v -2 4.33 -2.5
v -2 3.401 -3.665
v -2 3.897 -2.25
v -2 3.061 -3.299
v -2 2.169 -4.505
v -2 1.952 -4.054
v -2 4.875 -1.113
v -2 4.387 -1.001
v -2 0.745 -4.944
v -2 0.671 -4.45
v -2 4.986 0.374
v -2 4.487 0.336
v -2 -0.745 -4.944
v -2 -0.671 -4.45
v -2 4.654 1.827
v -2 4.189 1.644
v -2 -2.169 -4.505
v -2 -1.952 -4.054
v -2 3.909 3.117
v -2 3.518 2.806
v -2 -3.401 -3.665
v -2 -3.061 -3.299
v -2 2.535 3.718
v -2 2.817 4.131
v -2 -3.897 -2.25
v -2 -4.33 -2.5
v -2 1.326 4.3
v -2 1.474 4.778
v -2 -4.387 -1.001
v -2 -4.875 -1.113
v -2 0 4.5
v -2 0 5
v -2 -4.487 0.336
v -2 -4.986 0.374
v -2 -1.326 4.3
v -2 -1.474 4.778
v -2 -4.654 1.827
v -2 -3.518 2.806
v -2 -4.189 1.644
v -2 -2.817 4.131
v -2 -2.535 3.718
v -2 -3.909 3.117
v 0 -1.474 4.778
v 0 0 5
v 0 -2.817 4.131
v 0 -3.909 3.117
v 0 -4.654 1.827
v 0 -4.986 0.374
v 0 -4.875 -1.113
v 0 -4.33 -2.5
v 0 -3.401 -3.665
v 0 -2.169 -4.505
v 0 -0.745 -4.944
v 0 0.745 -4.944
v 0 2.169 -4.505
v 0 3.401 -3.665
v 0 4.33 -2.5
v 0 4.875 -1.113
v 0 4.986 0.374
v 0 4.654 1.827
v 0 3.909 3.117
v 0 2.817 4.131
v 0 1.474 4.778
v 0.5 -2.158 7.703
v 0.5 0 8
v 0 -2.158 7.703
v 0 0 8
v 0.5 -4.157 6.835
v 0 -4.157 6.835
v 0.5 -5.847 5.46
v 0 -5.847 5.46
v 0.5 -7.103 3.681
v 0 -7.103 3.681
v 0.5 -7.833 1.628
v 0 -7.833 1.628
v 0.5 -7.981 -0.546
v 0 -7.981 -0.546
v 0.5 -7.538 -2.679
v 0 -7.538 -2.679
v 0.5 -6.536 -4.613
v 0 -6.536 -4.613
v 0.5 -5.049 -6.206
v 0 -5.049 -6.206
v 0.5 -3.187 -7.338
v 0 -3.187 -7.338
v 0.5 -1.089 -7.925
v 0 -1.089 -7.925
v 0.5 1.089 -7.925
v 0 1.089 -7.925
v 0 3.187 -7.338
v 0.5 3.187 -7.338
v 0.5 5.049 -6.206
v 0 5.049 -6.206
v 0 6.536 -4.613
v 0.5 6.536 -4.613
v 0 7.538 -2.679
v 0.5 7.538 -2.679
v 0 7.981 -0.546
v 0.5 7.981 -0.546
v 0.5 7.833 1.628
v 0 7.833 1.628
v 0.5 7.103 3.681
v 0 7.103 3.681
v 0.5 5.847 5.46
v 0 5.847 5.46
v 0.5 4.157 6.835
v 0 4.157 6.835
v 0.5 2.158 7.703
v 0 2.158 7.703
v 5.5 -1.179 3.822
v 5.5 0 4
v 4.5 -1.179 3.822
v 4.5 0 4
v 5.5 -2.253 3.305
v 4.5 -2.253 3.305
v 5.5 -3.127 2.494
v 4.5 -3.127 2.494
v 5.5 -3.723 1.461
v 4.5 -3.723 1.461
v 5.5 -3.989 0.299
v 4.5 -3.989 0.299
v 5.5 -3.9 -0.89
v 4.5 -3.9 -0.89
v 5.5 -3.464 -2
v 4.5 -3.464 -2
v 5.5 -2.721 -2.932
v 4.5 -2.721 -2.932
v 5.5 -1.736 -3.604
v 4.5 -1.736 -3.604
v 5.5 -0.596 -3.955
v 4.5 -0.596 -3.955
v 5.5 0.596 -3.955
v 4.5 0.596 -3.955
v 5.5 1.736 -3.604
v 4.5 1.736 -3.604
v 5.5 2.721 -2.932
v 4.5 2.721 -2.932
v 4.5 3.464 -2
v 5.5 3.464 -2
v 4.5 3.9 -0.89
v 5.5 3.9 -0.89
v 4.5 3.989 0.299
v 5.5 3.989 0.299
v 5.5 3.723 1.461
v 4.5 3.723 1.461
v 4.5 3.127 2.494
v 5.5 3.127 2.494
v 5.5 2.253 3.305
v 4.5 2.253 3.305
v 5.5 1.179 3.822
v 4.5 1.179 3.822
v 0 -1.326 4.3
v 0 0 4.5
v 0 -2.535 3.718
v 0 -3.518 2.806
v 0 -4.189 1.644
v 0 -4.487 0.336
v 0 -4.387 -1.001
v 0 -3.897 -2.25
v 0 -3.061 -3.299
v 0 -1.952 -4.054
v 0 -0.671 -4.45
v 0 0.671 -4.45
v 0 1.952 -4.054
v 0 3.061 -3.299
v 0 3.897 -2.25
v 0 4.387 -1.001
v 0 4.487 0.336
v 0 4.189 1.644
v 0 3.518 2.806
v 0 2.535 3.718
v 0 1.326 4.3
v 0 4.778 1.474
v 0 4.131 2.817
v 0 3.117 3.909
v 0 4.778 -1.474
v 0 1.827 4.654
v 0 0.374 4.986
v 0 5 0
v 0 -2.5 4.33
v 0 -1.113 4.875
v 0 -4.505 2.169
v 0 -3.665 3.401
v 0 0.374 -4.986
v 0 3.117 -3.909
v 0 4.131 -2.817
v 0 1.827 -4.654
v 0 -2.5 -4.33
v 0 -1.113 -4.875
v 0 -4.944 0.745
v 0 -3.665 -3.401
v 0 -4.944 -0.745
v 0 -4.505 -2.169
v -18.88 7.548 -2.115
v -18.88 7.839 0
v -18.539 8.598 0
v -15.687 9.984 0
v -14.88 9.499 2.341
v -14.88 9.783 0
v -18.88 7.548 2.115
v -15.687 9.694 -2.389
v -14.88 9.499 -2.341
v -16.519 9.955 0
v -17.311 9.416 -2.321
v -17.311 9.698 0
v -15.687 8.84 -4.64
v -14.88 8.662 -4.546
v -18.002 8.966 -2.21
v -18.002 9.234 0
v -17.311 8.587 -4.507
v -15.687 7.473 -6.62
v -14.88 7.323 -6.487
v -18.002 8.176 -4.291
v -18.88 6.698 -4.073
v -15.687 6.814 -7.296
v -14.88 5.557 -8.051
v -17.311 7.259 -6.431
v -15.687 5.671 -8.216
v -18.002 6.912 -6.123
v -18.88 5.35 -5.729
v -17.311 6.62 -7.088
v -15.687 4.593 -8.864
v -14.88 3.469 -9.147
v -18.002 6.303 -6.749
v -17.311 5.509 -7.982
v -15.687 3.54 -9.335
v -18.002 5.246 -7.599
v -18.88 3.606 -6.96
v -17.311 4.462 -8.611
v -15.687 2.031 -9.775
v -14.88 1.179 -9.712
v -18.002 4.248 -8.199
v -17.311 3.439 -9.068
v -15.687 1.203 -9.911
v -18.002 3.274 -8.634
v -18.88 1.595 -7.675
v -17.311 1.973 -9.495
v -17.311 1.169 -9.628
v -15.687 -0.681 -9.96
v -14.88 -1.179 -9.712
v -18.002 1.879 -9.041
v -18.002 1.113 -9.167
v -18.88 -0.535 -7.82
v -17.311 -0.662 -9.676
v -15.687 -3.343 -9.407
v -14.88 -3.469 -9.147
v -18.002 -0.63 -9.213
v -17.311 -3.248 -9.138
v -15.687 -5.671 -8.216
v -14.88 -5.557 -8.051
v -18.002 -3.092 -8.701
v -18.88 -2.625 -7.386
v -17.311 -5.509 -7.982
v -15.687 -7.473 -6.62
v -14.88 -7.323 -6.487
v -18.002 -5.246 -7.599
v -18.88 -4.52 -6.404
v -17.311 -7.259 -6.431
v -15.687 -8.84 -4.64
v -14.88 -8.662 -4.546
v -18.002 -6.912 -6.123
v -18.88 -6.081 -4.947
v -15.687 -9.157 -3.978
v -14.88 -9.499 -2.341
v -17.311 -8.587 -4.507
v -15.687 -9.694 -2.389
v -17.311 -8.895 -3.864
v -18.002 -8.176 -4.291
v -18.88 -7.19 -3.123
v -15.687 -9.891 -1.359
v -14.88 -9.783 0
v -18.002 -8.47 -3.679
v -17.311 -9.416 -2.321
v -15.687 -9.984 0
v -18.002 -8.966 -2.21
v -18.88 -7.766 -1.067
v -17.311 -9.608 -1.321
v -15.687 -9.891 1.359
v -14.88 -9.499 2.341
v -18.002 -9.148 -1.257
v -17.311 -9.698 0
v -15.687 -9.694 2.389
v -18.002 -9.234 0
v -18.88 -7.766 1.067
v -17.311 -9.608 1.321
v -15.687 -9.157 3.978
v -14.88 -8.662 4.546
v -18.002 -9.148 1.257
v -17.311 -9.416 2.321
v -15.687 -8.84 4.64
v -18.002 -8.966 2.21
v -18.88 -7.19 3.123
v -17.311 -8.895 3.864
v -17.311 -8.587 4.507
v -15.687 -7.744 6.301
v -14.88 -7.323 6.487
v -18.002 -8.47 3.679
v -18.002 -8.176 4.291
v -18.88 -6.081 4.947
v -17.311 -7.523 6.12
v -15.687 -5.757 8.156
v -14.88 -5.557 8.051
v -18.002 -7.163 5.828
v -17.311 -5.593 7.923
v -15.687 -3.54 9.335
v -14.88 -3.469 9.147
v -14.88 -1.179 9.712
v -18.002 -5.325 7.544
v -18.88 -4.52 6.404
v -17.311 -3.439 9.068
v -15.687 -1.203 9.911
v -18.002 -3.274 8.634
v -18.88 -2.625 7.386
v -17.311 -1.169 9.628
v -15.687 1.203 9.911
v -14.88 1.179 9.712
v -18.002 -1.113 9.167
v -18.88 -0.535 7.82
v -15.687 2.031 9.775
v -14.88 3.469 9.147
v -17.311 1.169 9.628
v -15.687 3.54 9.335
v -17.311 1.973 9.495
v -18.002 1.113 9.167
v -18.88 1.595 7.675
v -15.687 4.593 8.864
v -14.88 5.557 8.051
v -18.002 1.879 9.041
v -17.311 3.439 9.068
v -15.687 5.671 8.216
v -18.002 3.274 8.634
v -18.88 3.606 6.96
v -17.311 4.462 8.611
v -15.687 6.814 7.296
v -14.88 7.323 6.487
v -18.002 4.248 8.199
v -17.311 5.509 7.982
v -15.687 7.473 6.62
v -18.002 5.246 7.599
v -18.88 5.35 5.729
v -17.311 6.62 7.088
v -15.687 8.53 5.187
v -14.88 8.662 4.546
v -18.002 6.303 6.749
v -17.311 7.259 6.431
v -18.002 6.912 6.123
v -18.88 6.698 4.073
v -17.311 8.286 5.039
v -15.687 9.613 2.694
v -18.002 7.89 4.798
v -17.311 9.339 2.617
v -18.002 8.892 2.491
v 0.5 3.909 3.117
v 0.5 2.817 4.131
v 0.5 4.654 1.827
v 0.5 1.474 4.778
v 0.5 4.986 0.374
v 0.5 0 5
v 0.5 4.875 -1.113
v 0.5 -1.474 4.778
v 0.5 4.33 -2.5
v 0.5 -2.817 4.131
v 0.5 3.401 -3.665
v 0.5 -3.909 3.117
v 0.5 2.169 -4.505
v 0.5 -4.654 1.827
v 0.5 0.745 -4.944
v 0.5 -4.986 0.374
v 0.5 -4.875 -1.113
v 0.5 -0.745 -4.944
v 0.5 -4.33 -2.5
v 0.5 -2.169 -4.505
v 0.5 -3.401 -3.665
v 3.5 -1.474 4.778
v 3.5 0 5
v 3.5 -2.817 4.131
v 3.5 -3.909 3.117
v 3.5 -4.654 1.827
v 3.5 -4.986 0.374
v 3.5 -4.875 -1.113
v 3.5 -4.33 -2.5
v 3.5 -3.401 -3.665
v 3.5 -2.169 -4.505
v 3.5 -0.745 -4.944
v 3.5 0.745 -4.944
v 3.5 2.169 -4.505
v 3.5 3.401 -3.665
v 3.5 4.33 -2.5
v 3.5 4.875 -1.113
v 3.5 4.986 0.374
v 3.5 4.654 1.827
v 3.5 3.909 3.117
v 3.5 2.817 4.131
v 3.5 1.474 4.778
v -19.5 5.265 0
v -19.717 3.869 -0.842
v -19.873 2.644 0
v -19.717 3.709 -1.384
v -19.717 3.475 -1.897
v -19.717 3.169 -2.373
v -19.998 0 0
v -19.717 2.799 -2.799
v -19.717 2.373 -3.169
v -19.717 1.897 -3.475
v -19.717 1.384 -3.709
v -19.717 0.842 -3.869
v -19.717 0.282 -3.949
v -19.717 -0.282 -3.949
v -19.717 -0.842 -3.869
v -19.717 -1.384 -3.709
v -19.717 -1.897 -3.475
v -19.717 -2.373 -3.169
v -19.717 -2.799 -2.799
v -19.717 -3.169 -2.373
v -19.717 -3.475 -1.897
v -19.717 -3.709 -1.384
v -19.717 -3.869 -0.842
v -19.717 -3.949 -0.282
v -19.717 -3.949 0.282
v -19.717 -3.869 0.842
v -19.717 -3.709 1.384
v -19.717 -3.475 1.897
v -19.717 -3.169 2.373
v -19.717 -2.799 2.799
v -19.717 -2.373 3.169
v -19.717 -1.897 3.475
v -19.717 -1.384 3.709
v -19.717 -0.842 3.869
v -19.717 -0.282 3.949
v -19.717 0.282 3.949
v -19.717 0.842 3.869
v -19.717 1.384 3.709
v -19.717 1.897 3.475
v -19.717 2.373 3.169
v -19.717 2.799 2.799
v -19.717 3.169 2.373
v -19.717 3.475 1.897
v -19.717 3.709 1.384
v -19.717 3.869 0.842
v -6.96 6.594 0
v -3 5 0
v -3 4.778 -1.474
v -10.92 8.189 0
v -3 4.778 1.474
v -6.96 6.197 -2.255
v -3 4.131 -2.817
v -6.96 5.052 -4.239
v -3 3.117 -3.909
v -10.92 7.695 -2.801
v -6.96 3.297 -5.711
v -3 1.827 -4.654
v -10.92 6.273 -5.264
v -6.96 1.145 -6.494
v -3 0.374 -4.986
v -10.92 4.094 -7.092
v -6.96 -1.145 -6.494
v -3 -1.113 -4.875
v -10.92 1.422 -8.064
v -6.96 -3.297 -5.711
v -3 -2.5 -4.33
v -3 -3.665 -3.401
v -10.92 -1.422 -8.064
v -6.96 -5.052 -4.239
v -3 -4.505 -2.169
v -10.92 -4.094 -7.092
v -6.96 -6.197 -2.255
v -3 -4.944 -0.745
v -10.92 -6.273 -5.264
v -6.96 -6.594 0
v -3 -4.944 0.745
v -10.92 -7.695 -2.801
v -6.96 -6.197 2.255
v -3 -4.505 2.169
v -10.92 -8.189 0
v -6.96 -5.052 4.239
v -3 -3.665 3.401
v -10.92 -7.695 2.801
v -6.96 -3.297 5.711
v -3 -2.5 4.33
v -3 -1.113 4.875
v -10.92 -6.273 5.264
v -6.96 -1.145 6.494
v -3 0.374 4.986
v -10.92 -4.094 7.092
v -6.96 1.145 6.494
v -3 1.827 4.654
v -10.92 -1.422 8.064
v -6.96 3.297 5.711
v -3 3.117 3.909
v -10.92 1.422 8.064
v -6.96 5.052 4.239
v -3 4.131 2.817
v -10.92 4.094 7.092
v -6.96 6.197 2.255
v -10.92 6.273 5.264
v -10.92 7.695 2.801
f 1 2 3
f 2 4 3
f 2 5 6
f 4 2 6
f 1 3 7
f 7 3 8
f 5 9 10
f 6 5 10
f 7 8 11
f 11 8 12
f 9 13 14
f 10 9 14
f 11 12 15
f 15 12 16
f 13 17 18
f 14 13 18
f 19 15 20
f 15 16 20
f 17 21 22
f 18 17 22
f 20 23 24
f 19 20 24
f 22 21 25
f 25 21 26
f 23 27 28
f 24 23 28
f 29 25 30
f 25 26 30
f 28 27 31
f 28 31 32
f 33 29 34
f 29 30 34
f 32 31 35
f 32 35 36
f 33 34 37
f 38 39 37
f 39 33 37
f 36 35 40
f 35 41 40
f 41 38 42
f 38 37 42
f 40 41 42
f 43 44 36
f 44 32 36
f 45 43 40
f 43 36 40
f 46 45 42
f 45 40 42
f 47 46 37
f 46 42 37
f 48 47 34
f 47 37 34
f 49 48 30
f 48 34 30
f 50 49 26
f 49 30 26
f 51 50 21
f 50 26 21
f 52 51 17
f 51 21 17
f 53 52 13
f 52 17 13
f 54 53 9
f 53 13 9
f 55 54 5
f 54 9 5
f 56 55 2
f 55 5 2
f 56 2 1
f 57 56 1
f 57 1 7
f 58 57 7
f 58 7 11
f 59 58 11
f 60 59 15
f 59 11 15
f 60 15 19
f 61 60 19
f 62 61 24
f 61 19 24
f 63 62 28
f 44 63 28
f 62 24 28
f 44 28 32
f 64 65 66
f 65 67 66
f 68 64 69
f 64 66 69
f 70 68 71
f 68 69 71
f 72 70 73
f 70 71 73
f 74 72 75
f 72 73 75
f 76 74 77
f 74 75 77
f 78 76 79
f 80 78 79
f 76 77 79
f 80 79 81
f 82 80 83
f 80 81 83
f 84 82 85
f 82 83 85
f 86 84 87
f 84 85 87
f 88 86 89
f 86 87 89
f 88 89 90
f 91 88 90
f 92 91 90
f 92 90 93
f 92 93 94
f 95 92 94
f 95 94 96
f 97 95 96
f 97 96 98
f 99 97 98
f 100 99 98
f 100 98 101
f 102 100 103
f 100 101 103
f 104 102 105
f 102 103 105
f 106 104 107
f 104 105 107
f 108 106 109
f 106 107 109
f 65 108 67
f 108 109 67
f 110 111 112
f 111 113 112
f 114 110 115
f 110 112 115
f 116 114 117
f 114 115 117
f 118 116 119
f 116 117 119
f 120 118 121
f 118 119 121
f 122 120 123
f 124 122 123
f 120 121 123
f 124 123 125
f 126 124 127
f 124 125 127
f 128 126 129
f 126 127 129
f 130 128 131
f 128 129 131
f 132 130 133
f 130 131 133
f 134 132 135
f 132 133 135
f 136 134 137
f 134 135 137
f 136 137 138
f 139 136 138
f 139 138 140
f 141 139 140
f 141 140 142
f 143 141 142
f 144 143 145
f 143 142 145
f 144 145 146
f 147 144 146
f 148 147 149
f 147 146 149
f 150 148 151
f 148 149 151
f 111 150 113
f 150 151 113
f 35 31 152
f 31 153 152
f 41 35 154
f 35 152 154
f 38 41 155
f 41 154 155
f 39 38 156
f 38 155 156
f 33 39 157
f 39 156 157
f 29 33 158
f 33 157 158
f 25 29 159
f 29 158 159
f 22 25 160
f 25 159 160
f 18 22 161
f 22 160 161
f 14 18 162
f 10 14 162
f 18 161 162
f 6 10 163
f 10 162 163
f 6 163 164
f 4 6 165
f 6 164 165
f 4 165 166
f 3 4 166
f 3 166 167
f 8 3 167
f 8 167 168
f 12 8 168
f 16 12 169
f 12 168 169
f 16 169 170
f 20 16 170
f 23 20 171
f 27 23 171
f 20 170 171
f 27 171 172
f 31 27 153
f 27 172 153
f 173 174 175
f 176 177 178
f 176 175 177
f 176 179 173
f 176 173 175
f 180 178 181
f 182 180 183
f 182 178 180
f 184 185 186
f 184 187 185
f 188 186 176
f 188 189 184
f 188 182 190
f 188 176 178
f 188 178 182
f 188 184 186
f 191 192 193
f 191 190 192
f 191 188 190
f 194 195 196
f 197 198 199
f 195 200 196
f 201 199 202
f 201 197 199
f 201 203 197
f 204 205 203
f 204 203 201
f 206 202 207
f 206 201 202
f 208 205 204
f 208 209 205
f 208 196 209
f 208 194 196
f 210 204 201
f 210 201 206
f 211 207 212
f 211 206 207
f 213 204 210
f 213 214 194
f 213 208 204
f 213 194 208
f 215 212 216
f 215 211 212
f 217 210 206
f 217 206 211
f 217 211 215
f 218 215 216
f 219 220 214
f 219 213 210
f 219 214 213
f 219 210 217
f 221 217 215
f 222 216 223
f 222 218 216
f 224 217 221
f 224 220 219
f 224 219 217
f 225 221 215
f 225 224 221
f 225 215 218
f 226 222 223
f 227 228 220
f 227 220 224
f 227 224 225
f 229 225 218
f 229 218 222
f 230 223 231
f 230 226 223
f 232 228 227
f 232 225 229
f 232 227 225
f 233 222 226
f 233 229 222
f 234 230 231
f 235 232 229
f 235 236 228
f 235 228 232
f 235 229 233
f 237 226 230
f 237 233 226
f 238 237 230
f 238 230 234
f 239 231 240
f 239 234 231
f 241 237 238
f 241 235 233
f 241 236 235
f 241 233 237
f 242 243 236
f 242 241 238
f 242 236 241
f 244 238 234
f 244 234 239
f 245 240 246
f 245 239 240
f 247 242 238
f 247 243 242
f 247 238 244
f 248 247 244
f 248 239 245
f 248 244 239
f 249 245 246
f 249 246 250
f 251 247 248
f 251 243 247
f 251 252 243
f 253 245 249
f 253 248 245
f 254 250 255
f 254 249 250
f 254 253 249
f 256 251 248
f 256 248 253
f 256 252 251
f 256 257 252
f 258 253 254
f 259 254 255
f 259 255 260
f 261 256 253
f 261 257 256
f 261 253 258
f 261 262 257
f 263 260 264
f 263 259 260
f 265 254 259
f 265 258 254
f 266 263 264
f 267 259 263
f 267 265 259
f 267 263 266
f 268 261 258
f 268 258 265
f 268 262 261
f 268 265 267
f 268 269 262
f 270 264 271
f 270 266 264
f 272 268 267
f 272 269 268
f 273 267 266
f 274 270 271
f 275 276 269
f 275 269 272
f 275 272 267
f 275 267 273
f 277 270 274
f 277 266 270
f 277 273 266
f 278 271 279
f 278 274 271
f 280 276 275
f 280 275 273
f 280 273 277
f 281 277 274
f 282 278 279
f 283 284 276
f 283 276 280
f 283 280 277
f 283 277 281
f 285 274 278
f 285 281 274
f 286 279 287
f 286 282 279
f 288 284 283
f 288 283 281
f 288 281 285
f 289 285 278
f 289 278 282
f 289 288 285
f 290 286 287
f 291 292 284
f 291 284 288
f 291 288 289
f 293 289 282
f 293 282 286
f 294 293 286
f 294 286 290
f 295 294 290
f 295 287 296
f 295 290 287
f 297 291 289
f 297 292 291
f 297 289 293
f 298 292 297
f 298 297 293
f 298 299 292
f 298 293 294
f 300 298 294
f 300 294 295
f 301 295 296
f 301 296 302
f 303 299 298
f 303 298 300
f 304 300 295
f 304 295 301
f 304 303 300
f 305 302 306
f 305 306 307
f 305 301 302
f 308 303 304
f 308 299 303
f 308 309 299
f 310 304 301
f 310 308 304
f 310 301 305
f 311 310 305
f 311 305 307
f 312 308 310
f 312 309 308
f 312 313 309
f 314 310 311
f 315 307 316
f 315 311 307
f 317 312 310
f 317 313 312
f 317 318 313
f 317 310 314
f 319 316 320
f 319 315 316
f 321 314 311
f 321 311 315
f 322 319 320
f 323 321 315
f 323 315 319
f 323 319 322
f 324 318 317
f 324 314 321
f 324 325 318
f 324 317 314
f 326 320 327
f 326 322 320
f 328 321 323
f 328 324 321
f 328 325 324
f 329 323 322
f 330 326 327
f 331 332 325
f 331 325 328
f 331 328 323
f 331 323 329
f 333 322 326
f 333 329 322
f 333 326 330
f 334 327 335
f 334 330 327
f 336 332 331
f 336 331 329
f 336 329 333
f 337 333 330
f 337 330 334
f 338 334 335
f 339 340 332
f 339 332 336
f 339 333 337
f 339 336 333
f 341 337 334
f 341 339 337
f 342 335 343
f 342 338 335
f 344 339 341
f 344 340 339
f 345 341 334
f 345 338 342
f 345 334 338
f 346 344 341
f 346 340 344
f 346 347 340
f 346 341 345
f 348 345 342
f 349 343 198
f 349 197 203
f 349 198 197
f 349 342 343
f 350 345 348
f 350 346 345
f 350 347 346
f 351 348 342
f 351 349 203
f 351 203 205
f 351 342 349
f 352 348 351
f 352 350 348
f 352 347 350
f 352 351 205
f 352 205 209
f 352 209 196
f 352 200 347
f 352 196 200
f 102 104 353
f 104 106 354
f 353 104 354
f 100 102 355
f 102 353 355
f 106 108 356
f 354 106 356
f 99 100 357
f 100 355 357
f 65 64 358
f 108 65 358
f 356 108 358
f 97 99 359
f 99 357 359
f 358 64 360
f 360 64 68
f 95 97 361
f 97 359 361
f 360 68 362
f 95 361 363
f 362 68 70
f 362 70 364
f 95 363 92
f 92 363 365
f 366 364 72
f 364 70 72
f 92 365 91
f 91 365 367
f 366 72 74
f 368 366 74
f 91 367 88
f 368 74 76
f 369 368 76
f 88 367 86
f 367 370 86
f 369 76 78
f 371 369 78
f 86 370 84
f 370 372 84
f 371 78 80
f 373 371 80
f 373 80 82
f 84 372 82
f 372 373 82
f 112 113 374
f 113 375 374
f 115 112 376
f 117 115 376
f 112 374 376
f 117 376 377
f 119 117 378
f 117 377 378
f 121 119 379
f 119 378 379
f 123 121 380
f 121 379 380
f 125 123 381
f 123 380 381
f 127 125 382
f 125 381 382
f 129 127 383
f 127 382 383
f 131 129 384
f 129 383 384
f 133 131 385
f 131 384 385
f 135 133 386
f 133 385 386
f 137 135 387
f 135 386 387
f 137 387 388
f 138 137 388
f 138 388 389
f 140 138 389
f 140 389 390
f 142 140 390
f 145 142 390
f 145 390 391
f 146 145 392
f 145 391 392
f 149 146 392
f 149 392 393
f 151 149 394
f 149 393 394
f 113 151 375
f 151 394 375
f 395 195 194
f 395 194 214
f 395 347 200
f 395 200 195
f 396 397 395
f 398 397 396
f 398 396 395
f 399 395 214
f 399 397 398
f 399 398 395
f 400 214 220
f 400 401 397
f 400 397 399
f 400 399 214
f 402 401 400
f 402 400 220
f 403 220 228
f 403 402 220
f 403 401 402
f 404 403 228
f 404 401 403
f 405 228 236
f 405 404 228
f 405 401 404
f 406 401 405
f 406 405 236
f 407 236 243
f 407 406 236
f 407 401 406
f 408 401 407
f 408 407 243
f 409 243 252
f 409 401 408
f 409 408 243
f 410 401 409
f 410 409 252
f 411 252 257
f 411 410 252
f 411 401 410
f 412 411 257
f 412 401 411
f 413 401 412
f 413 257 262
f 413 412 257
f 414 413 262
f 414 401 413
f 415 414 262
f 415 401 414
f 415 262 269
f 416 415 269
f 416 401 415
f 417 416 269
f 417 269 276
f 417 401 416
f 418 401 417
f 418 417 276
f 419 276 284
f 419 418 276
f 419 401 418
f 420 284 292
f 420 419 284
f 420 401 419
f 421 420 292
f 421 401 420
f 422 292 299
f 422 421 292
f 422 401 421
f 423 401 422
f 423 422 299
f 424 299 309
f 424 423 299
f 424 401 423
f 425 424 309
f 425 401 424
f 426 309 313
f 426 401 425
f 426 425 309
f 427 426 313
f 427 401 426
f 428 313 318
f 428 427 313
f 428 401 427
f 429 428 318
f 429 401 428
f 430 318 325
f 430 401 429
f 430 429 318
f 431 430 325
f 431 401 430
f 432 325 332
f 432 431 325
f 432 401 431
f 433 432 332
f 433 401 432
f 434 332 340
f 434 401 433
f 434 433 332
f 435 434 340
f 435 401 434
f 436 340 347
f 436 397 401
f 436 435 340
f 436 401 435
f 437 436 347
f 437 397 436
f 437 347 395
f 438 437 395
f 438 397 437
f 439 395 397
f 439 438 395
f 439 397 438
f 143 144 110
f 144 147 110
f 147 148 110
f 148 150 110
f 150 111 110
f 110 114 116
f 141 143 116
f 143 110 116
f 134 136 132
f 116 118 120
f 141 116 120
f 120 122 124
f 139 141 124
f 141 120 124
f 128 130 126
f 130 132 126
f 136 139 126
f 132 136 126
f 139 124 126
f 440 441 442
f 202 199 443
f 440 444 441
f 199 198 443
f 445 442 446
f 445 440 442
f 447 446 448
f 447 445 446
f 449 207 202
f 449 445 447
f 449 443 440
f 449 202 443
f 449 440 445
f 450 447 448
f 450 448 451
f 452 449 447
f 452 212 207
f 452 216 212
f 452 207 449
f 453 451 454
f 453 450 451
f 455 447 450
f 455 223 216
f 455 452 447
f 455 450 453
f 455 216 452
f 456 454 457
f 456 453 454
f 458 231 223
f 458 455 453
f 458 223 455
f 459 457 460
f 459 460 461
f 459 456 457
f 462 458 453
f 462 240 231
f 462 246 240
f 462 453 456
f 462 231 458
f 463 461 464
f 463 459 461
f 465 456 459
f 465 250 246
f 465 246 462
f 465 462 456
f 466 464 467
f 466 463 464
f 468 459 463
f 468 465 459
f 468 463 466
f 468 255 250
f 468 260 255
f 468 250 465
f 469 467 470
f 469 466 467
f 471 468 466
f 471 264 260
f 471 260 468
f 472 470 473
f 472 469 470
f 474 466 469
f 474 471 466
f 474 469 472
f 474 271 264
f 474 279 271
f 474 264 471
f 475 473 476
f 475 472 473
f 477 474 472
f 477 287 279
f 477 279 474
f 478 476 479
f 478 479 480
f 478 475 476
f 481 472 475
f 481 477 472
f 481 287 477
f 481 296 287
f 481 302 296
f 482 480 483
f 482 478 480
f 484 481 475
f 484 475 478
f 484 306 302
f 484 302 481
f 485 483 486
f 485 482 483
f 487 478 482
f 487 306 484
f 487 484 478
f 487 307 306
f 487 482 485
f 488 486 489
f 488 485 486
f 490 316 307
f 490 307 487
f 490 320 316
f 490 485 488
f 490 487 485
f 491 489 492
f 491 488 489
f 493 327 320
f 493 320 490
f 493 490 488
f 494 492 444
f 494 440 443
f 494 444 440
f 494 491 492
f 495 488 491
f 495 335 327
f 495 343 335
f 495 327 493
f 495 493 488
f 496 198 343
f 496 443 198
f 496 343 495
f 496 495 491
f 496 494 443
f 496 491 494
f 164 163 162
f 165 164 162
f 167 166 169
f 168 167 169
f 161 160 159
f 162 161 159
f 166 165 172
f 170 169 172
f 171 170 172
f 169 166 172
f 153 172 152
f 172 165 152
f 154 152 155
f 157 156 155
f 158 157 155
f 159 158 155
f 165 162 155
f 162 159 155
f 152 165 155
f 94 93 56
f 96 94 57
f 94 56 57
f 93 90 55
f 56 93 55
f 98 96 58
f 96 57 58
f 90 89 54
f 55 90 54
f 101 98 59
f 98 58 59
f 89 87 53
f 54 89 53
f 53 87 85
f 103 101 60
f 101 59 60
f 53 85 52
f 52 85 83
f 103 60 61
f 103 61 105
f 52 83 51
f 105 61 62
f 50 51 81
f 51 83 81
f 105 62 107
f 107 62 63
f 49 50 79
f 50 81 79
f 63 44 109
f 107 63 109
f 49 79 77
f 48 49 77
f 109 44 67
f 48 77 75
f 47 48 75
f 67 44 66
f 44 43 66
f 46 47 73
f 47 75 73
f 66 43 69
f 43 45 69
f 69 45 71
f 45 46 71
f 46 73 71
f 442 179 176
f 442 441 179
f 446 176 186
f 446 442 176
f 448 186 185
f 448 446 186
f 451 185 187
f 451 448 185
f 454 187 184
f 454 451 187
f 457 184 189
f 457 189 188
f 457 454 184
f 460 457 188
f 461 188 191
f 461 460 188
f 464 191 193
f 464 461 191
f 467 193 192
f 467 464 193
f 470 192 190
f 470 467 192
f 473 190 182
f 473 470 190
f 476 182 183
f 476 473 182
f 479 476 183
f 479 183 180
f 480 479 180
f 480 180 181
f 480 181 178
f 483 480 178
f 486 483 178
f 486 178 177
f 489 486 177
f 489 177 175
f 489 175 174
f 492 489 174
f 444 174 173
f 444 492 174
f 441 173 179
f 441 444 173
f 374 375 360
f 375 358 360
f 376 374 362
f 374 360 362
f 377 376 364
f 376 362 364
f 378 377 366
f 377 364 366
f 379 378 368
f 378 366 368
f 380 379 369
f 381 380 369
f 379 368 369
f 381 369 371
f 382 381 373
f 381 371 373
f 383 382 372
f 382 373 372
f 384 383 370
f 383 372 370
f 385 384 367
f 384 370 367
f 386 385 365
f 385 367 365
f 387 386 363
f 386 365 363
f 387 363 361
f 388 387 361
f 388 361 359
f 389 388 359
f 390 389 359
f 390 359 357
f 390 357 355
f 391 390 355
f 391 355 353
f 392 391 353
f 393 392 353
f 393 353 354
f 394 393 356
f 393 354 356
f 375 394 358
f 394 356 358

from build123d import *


with BuildPart() as part:
    # Sketch1 → Revolve1 (revolve)
    with BuildSketch(Plane.XY, mode=Mode.PRIVATE) as revolve1_sk:
        Polygon((0, 0), (5.5, 0), (5.5, 4), (4.5, 4), (3.5, 5), (0.5, 5), (0.5, 8), (0, 8), (0, 5), (-2, 5), (-2, 4.5), (0, 4.5), align=None)
    revolve(revolve1_sk.sketch.rotate(Axis((0, 0, 0), (1, 0, 0)), 90), axis=Axis((0, 0, 0), (1, 0, 0)))


with BuildPart() as body_2:
    # Sketch2 → Revolve2 (revolve)
    with BuildSketch(Plane.XY):
        with BuildLine():
            Line((0, 0), (0, 5))
            Line((0, 5), (-3, 5))
            Line((-3, 5), (-14.879552076, 9.782911506))
            ThreePointArc((-14.879552076, 9.782911506), (-17.311251394, 9.698262363), (-18.880391035, 7.838658147))
            ThreePointArc((-18.880391035, 7.838658147), (-19.717442945, 3.958988597), (-19.998336164, 0))
            Line((-19.998336164, 0), (0, 0))
        make_face()
    revolve(axis=Axis((0, 0, 0), (-1, 0, 0)))


solid = Compound([part.part, body_2.part])
